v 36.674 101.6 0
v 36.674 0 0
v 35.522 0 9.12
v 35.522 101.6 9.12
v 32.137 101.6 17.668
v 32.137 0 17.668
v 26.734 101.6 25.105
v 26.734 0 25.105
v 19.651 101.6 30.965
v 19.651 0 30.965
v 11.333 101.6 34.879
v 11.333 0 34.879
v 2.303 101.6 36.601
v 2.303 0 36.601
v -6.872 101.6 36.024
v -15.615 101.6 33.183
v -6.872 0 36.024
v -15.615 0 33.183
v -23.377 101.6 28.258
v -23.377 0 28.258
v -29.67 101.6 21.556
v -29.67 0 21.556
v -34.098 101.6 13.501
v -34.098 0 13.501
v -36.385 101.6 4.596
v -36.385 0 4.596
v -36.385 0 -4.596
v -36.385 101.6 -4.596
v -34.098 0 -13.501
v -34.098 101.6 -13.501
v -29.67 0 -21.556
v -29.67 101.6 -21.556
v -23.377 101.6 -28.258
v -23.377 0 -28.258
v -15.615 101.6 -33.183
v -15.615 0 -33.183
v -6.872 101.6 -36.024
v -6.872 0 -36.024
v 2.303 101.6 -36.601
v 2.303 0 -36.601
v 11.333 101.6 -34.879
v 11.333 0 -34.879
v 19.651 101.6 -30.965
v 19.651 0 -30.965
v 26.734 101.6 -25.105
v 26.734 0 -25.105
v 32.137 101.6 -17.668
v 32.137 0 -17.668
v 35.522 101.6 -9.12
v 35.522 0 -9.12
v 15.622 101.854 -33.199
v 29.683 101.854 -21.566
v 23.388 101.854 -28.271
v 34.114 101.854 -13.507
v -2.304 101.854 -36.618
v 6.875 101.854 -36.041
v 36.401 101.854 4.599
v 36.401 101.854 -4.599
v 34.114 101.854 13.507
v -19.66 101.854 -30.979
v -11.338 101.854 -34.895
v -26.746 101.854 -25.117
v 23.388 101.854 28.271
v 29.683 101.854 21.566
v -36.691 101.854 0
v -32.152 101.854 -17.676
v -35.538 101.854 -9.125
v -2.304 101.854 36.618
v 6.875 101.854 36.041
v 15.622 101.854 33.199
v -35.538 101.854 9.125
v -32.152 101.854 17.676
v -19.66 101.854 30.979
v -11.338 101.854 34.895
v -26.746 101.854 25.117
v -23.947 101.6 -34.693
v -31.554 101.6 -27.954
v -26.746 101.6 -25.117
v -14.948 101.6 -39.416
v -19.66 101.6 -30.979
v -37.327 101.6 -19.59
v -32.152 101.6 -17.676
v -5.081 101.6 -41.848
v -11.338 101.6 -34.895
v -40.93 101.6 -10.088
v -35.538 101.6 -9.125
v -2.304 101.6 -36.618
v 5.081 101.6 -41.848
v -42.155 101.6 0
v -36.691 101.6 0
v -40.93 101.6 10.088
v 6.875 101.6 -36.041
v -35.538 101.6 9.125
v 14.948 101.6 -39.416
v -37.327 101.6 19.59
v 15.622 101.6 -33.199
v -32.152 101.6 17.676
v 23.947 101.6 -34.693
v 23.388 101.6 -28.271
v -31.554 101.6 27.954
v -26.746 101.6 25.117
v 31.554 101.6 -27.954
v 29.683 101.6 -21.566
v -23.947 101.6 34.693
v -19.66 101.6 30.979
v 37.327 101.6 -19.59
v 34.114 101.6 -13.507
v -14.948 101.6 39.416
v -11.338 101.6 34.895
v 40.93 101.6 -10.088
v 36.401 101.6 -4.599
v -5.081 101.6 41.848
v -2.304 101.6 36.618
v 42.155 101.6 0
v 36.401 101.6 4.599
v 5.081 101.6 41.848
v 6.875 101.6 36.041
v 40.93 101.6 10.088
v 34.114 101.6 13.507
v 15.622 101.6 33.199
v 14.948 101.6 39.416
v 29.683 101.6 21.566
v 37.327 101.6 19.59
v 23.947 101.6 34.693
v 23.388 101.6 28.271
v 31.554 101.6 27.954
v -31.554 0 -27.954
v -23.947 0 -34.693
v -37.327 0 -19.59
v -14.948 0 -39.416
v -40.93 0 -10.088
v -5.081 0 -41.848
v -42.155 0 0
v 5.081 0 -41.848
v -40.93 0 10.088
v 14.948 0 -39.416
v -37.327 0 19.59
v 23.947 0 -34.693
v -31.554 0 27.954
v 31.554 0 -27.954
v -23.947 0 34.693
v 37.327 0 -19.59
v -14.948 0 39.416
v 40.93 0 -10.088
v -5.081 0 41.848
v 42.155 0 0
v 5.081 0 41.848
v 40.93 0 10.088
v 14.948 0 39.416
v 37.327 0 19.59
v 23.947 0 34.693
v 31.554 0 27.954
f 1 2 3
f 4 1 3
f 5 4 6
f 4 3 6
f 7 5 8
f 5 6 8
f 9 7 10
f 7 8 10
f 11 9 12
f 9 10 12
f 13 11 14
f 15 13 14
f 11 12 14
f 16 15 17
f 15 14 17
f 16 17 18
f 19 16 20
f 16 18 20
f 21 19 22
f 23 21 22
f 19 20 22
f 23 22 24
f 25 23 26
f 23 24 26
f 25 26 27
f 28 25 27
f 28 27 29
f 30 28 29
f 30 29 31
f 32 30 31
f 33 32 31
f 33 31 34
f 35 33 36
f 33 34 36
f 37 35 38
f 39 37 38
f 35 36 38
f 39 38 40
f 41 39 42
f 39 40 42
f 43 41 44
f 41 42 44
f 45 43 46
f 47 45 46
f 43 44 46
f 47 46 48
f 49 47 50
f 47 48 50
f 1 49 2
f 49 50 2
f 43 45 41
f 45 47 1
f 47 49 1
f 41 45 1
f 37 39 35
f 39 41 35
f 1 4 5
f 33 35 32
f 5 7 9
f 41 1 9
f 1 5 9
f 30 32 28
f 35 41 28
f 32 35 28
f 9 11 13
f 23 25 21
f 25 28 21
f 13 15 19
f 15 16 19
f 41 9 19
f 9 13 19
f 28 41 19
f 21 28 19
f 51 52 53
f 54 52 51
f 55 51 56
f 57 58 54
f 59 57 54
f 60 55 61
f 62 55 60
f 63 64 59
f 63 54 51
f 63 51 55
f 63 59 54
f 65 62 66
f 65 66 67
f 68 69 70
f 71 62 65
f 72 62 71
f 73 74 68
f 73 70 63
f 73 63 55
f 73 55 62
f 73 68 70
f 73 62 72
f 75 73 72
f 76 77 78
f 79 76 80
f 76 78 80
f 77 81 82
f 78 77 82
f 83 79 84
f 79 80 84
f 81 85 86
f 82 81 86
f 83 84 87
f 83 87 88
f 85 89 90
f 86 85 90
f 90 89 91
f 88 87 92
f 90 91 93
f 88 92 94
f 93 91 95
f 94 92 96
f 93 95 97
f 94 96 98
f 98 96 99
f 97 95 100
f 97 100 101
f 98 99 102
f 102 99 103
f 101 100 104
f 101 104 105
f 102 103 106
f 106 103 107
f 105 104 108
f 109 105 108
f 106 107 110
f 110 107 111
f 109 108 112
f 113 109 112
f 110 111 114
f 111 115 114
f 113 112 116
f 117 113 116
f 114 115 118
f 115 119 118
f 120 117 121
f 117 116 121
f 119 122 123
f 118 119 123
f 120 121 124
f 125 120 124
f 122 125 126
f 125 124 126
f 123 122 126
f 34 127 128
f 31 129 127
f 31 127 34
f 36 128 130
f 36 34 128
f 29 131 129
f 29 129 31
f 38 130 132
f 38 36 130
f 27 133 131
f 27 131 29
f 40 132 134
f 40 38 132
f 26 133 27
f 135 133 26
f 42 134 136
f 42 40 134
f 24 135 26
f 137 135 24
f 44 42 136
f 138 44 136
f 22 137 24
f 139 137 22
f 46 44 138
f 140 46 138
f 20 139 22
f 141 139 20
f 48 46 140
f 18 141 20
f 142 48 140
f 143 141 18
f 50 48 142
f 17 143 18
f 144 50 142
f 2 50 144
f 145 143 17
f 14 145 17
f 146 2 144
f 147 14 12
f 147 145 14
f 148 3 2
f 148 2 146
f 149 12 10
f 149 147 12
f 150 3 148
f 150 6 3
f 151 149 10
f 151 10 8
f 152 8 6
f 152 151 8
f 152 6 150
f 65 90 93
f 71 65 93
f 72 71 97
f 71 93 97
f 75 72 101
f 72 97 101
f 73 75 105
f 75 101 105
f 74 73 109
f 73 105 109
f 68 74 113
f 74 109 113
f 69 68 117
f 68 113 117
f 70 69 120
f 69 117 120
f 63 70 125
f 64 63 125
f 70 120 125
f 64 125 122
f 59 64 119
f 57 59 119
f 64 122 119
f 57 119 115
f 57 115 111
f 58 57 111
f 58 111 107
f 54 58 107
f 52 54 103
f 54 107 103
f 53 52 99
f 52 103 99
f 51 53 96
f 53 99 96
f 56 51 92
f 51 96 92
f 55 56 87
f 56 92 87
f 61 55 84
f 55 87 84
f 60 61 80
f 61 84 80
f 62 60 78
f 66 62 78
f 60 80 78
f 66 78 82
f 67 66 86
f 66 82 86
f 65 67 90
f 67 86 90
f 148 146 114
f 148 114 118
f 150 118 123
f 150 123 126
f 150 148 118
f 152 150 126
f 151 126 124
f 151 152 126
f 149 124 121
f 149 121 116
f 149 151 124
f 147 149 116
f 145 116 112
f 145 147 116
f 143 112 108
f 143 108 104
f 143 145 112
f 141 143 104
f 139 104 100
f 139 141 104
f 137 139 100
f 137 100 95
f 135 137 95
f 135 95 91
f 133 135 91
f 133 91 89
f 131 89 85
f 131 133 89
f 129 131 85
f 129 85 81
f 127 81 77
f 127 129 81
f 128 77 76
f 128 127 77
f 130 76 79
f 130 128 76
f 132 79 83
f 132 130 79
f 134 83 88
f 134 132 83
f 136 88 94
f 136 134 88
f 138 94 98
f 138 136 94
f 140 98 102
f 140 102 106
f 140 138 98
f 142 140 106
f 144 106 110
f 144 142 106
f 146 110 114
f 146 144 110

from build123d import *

# Parameters (mm, degrees)
F0_R     = 42.1551609163
F0_R_2   = 36.6737913898
F1_DEPTH = 101.6
F2_R     = 36.6906853339
F3_DEPTH = 0.254


# Not quite as in the source:
# - the program builds the solid bodies; features that only make, move or delete a surface that nothing else refers to are left out


with BuildPart() as f1:
    # F0 (on Front) → F1 (new body)
    with BuildSketch(Plane.XZ):
        Circle(F0_R)
        Circle(F0_R_2, mode=Mode.SUBTRACT)
    extrude(amount=-F1_DEPTH)

    # F2 (on face) → F3 (join)
    with BuildSketch(Plane(origin=(0, 101.6, 0), x_dir=(-1, 0, 0), z_dir=(0, 1, 0))):
        Circle(F2_R)
    extrude(amount=F3_DEPTH)


solid = f1.part
